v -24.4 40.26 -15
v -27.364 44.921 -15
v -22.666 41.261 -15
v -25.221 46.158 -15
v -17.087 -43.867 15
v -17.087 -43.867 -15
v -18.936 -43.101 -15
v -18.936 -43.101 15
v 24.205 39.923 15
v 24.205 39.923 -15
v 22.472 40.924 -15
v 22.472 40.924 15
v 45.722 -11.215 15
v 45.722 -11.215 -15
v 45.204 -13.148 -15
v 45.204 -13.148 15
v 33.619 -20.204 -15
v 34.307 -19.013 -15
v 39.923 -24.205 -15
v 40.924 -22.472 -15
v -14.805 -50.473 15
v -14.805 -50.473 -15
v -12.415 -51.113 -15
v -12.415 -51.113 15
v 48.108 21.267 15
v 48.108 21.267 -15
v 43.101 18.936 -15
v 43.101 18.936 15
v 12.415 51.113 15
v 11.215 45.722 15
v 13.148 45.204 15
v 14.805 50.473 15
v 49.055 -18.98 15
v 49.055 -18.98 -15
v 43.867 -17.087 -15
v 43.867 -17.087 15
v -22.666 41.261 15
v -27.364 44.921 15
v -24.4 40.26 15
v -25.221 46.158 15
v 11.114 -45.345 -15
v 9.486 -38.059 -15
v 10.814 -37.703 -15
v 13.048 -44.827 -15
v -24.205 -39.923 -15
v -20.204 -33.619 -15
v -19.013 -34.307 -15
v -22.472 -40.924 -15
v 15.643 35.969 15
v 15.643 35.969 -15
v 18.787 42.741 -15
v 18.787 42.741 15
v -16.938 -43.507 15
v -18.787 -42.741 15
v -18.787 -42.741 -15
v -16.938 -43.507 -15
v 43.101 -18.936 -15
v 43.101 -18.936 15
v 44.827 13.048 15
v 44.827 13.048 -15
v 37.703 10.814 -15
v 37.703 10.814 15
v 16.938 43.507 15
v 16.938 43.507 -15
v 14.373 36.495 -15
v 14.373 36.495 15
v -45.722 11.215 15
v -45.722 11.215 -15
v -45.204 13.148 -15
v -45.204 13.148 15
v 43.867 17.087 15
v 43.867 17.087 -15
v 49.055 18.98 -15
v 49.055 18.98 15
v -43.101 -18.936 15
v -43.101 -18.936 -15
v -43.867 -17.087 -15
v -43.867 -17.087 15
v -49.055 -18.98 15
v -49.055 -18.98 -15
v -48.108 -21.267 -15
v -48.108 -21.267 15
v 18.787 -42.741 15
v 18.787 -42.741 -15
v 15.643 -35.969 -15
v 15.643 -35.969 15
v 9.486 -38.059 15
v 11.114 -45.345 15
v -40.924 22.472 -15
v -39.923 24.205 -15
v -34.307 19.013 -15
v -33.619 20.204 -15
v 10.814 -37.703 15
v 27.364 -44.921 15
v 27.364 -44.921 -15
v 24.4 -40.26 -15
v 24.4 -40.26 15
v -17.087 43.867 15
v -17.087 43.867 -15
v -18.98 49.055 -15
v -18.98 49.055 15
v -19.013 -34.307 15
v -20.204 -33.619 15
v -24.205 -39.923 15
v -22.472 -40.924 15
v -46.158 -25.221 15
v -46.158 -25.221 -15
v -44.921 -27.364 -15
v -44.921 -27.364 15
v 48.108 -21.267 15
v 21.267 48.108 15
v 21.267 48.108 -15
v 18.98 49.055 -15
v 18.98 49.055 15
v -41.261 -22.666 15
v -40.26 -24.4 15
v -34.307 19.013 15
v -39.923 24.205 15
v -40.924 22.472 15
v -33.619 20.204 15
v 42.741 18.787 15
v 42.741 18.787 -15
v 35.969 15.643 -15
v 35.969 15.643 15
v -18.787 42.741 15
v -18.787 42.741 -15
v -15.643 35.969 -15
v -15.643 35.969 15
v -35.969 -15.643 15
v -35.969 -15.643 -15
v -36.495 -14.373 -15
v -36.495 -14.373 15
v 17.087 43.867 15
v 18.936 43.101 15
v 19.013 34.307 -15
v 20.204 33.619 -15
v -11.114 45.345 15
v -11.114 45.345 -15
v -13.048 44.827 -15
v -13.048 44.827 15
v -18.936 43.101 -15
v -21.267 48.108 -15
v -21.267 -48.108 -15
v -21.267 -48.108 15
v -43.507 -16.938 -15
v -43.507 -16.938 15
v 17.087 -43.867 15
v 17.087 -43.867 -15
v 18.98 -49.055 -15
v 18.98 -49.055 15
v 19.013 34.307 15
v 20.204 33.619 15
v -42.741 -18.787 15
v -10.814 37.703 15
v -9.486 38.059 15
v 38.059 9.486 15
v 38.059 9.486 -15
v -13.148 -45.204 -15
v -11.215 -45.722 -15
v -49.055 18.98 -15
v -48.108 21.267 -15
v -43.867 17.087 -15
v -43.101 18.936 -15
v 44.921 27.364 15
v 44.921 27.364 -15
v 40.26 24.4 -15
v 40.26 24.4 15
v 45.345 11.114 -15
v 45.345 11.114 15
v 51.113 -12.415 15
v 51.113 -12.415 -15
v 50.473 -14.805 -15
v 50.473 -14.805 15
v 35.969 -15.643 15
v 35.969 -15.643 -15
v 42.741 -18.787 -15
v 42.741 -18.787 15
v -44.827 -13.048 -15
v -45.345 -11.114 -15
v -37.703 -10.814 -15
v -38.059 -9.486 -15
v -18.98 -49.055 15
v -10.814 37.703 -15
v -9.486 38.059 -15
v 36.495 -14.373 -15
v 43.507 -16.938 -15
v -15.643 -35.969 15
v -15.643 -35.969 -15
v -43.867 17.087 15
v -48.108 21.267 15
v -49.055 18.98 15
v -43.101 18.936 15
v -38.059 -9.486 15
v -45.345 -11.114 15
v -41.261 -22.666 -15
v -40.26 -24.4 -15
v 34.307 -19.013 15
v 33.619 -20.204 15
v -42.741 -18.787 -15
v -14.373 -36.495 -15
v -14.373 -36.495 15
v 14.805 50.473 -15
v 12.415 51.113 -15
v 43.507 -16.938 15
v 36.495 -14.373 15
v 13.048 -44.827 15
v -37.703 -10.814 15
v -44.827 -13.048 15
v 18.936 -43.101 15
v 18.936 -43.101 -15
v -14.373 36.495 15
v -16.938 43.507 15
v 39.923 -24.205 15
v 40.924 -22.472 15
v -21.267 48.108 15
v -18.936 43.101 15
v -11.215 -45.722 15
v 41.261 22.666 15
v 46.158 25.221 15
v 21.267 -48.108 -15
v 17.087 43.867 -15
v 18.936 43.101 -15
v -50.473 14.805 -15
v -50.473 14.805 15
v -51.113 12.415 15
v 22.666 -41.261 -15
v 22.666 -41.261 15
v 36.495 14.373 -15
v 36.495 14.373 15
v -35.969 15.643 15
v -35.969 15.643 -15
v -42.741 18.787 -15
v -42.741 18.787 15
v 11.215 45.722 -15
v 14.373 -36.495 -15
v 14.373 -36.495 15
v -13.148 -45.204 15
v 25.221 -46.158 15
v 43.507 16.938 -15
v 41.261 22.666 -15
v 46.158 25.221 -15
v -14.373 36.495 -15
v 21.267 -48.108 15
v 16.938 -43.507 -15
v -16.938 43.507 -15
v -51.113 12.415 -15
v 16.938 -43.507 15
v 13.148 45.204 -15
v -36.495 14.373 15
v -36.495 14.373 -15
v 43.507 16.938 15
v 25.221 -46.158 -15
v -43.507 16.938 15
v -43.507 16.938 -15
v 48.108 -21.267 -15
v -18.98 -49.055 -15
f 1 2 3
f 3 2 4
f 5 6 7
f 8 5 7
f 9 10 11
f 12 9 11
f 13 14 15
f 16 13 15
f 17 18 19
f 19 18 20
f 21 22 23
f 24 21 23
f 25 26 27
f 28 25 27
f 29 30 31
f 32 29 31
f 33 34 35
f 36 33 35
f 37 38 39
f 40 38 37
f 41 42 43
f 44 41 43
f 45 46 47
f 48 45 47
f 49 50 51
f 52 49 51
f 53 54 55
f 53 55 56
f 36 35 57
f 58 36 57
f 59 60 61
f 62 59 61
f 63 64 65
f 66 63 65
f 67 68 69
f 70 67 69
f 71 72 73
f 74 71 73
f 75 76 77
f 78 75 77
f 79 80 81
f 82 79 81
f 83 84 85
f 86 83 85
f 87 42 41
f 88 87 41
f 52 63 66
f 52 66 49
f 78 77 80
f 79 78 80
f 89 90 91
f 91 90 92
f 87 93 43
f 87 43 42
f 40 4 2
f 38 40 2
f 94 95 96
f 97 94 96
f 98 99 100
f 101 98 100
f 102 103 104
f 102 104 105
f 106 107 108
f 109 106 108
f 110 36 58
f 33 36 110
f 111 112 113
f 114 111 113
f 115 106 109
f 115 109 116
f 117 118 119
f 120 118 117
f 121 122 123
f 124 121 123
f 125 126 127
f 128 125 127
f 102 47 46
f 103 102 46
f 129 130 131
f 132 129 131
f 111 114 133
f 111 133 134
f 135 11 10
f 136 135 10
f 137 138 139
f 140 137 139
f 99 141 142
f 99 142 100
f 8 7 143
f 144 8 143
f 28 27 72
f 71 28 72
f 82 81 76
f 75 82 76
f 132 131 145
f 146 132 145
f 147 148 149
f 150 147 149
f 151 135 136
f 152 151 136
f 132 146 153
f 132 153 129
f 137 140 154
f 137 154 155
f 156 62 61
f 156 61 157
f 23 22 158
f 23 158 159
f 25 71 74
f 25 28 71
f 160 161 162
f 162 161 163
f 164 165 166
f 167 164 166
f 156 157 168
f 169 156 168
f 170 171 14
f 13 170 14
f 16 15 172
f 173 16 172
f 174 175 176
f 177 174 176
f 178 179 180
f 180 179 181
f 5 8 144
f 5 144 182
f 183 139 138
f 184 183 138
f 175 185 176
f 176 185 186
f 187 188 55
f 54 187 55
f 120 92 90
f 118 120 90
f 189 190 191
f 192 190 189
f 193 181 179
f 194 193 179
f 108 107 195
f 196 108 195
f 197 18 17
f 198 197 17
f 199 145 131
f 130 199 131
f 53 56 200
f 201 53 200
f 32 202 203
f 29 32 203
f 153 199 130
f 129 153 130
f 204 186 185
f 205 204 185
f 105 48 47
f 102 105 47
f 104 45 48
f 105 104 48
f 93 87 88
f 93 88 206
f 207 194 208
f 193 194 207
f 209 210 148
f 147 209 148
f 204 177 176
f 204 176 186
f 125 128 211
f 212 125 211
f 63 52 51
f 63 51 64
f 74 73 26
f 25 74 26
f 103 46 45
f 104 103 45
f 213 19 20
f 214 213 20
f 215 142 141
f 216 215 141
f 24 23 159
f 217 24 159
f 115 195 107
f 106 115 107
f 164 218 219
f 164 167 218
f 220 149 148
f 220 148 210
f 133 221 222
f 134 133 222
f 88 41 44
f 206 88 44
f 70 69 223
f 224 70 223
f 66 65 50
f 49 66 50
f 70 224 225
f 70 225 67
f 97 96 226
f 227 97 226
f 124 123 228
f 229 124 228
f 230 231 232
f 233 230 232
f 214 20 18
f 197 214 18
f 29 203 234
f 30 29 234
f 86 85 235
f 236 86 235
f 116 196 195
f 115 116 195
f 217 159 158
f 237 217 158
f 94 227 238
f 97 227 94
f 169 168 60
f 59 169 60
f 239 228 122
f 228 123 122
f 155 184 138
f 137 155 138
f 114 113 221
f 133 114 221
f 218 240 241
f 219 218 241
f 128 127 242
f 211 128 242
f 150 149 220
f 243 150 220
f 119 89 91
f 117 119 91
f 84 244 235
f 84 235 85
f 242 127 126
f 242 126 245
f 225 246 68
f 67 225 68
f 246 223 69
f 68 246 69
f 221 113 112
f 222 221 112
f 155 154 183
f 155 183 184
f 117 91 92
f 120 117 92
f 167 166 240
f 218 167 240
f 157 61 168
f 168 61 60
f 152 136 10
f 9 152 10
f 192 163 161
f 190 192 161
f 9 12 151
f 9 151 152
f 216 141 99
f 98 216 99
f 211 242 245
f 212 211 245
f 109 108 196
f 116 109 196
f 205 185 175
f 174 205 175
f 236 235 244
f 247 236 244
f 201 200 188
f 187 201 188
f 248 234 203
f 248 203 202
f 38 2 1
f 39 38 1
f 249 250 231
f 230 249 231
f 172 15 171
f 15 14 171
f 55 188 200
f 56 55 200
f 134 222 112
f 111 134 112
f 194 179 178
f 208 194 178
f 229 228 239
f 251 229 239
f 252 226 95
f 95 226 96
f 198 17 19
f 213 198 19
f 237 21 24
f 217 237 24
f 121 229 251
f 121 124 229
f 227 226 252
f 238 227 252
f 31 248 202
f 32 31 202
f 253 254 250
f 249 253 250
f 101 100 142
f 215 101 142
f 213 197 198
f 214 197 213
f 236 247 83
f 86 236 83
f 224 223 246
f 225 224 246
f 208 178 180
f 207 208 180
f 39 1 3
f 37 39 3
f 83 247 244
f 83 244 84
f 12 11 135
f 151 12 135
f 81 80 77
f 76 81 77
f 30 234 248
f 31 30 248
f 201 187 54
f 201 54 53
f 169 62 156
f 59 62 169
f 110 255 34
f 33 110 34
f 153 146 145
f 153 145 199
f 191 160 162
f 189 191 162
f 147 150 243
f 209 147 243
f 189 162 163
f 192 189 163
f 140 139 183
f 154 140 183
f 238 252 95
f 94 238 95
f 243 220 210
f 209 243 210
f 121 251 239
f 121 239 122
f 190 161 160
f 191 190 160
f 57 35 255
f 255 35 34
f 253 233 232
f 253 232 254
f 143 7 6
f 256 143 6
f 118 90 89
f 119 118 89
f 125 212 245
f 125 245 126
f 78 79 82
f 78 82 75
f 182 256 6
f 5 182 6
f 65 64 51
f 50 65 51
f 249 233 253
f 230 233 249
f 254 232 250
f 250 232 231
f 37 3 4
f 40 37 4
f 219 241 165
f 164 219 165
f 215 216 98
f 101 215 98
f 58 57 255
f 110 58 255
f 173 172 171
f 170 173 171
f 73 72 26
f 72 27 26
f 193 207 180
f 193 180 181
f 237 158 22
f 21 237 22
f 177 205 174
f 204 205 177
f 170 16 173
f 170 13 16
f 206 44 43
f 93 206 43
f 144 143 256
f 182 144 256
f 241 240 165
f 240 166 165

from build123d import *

# Parameters (mm, degrees)
SLOT_COPPER_ENVELOPES_START    = -15
SLOT_COPPER_ENVELOPES_DEPTH    = 30
SLOT_COPPER_ENVELOPES_2_DEPTH  = 30
SLOT_COPPER_ENVELOPES_3_DEPTH  = 30
SLOT_COPPER_ENVELOPES_4_DEPTH  = 30
SLOT_COPPER_ENVELOPES_5_DEPTH  = 30
SLOT_COPPER_ENVELOPES_6_DEPTH  = 30
SLOT_COPPER_ENVELOPES_7_DEPTH  = 30
SLOT_COPPER_ENVELOPES_8_DEPTH  = 30
SLOT_COPPER_ENVELOPES_9_DEPTH  = 30
SLOT_COPPER_ENVELOPES_10_DEPTH = 30
SLOT_COPPER_ENVELOPES_11_DEPTH = 30
SLOT_COPPER_ENVELOPES_12_DEPTH = 30
SLOT_COPPER_ENVELOPES_13_DEPTH = 30
SLOT_COPPER_ENVELOPES_14_DEPTH = 30
SLOT_COPPER_ENVELOPES_15_DEPTH = 30
SLOT_COPPER_ENVELOPES_16_DEPTH = 30
SLOT_COPPER_ENVELOPES_17_DEPTH = 30
SLOT_COPPER_ENVELOPES_18_DEPTH = 30
SLOT_COPPER_ENVELOPES_19_DEPTH = 30
SLOT_COPPER_ENVELOPES_20_DEPTH = 30
SLOT_COPPER_ENVELOPES_21_DEPTH = 30
SLOT_COPPER_ENVELOPES_22_DEPTH = 30
SLOT_COPPER_ENVELOPES_23_DEPTH = 30
SLOT_COPPER_ENVELOPES_24_DEPTH = 30
SLOT_COPPER_ENVELOPES_25_DEPTH = 30
SLOT_COPPER_ENVELOPES_26_DEPTH = 30
SLOT_COPPER_ENVELOPES_27_DEPTH = 30
SLOT_COPPER_ENVELOPES_28_DEPTH = 30
SLOT_COPPER_ENVELOPES_29_DEPTH = 30
SLOT_COPPER_ENVELOPES_30_DEPTH = 30
SLOT_COPPER_ENVELOPES_31_DEPTH = 30
SLOT_COPPER_ENVELOPES_32_DEPTH = 30


with BuildPart() as part:
    # Эскиз1 → Slot_copper_envelopes (new body)
    with BuildSketch(Plane.XY.offset(SLOT_COPPER_ENVELOPES_START)):
        Polygon((38.058700706, 9.486045745), (45.345480219, 11.114145895), (44.827410764, 13.047607424), (37.702824519, 10.814193756), align=None)
    extrude(amount=SLOT_COPPER_ENVELOPES_DEPTH)


with BuildPart() as body_2:
    # Эскиз1 → Slot_copper_envelopes 2 (new body)
    with BuildSketch(Plane.XY.offset(SLOT_COPPER_ENVELOPES_START)):
        Polygon((43.866578102, 17.086837391), (49.055420626, 18.979960184), (48.108279131, 21.266562026), (43.100573431, 18.936136255), align=None)
    extrude(amount=SLOT_COPPER_ENVELOPES_2_DEPTH)


with BuildPart() as body_3:
    # Эскиз1 → Slot_copper_envelopes 3 (new body)
    with BuildSketch(Plane.XY.offset(SLOT_COPPER_ENVELOPES_START)):
        Polygon((36.494925815, 14.372548593), (43.506856207, 16.937835703), (42.740851536, 18.787134567), (35.968736096, 15.64288295), align=None)
    extrude(amount=SLOT_COPPER_ENVELOPES_3_DEPTH)


with BuildPart() as body_4:
    # Эскиз1 → Slot_copper_envelopes 4 (new body)
    with BuildSketch(Plane.XY.offset(SLOT_COPPER_ENVELOPES_START)):
        Polygon((41.261013623, 22.666394534), (46.158362771, 25.220601255), (44.920862771, 27.364014129), (40.26018029, 24.399888717), align=None)
    extrude(amount=SLOT_COPPER_ENVELOPES_4_DEPTH)


with BuildPart() as body_5:
    # Эскиз1 → Slot_copper_envelopes 5 (new body)
    with BuildSketch(Plane.XY.offset(SLOT_COPPER_ENVELOPES_START)):
        Polygon((20.203918079, 33.619212625), (24.20520863, 39.922984488), (22.471714447, 40.923817822), (19.013133149, 34.306712625), align=None)
    extrude(amount=SLOT_COPPER_ENVELOPES_5_DEPTH)


with BuildPart() as body_6:
    # Эскиз1 → Slot_copper_envelopes 6 (new body)
    with BuildSketch(Plane.XY.offset(SLOT_COPPER_ENVELOPES_START)):
        Polygon((18.936136255, 43.100573431), (21.266562026, 48.108279131), (18.979960184, 49.055420626), (17.086837391, 43.866578102), align=None)
    extrude(amount=SLOT_COPPER_ENVELOPES_6_DEPTH)


with BuildPart() as body_7:
    # Эскиз1 → Slot_copper_envelopes 7 (new body)
    with BuildSketch(Plane.XY.offset(SLOT_COPPER_ENVELOPES_START)):
        Polygon((15.64288295, 35.968736096), (18.787134567, 42.740851536), (16.937835703, 43.506856207), (14.372548593, 36.494925815), align=None)
    extrude(amount=SLOT_COPPER_ENVELOPES_7_DEPTH)


with BuildPart() as body_8:
    # Эскиз1 → Slot_copper_envelopes 8 (new body)
    with BuildSketch(Plane.XY.offset(SLOT_COPPER_ENVELOPES_START)):
        Polygon((13.148381252, 45.203503812), (14.805233151, 50.472549497), (12.414566731, 51.113126634), (11.214919723, 45.721573267), align=None)
    extrude(amount=SLOT_COPPER_ENVELOPES_8_DEPTH)


with BuildPart() as body_9:
    # Эскиз1 → Slot_copper_envelopes 9 (new body)
    with BuildSketch(Plane.XY.offset(SLOT_COPPER_ENVELOPES_START)):
        Polygon((-9.486045745, 38.058700706), (-11.114145895, 45.345480219), (-13.047607424, 44.827410764), (-10.814193756, 37.702824519), align=None)
    extrude(amount=SLOT_COPPER_ENVELOPES_9_DEPTH)


with BuildPart() as body_10:
    # Эскиз1 → Slot_copper_envelopes 10 (new body)
    with BuildSketch(Plane.XY.offset(SLOT_COPPER_ENVELOPES_START)):
        Polygon((-17.086837391, 43.866578102), (-18.979960183, 49.055420626), (-21.266562026, 48.108279131), (-18.936136255, 43.100573431), align=None)
    extrude(amount=SLOT_COPPER_ENVELOPES_10_DEPTH)


with BuildPart() as body_11:
    # Эскиз1 → Slot_copper_envelopes 11 (new body)
    with BuildSketch(Plane.XY.offset(SLOT_COPPER_ENVELOPES_START)):
        Polygon((-14.372548593, 36.494925815), (-16.937835703, 43.506856207), (-18.787134567, 42.740851536), (-15.64288295, 35.968736096), align=None)
    extrude(amount=SLOT_COPPER_ENVELOPES_11_DEPTH)


with BuildPart() as body_12:
    # Эскиз1 → Slot_copper_envelopes 12 (new body)
    with BuildSketch(Plane.XY.offset(SLOT_COPPER_ENVELOPES_START)):
        Polygon((-22.666394534, 41.261013623), (-25.220601255, 46.158362771), (-27.364014129, 44.920862771), (-24.399888717, 40.26018029), align=None)
    extrude(amount=SLOT_COPPER_ENVELOPES_12_DEPTH)


with BuildPart() as body_13:
    # Эскиз1 → Slot_copper_envelopes 13 (new body)
    with BuildSketch(Plane.XY.offset(SLOT_COPPER_ENVELOPES_START)):
        Polygon((-33.619212625, 20.203918079), (-39.922984488, 24.20520863), (-40.923817822, 22.471714447), (-34.306712625, 19.013133149), align=None)
    extrude(amount=SLOT_COPPER_ENVELOPES_13_DEPTH)


with BuildPart() as body_14:
    # Эскиз1 → Slot_copper_envelopes 14 (new body)
    with BuildSketch(Plane.XY.offset(SLOT_COPPER_ENVELOPES_START)):
        Polygon((-43.100573431, 18.936136255), (-48.108279131, 21.266562026), (-49.055420626, 18.979960184), (-43.866578102, 17.086837391), align=None)
    extrude(amount=SLOT_COPPER_ENVELOPES_14_DEPTH)


with BuildPart() as body_15:
    # Эскиз1 → Slot_copper_envelopes 15 (new body)
    with BuildSketch(Plane.XY.offset(SLOT_COPPER_ENVELOPES_START)):
        Polygon((-35.968736096, 15.64288295), (-42.740851536, 18.787134567), (-43.506856207, 16.937835703), (-36.494925815, 14.372548593), align=None)
    extrude(amount=SLOT_COPPER_ENVELOPES_15_DEPTH)


with BuildPart() as body_16:
    # Эскиз1 → Slot_copper_envelopes 16 (new body)
    with BuildSketch(Plane.XY.offset(SLOT_COPPER_ENVELOPES_START)):
        Polygon((-45.203503812, 13.148381252), (-50.472549497, 14.805233151), (-51.113126634, 12.414566731), (-45.721573267, 11.214919723), align=None)
    extrude(amount=SLOT_COPPER_ENVELOPES_16_DEPTH)


with BuildPart() as body_17:
    # Эскиз1 → Slot_copper_envelopes 17 (new body)
    with BuildSketch(Plane.XY.offset(SLOT_COPPER_ENVELOPES_START)):
        Polygon((-38.058700706, -9.486045745), (-45.345480219, -11.114145895), (-44.827410764, -13.047607424), (-37.702824519, -10.814193756), align=None)
    extrude(amount=SLOT_COPPER_ENVELOPES_17_DEPTH)


with BuildPart() as body_18:
    # Эскиз1 → Slot_copper_envelopes 18 (new body)
    with BuildSketch(Plane.XY.offset(SLOT_COPPER_ENVELOPES_START)):
        Polygon((-43.866578102, -17.086837391), (-49.055420626, -18.979960184), (-48.108279131, -21.266562026), (-43.100573431, -18.936136255), align=None)
    extrude(amount=SLOT_COPPER_ENVELOPES_18_DEPTH)


with BuildPart() as body_19:
    # Эскиз1 → Slot_copper_envelopes 19 (new body)
    with BuildSketch(Plane.XY.offset(SLOT_COPPER_ENVELOPES_START)):
        Polygon((-36.494925815, -14.372548593), (-43.506856207, -16.937835703), (-42.740851536, -18.787134567), (-35.968736096, -15.64288295), align=None)
    extrude(amount=SLOT_COPPER_ENVELOPES_19_DEPTH)


with BuildPart() as body_20:
    # Эскиз1 → Slot_copper_envelopes 20 (new body)
    with BuildSketch(Plane.XY.offset(SLOT_COPPER_ENVELOPES_START)):
        Polygon((-41.261013623, -22.666394534), (-46.158362771, -25.220601255), (-44.920862771, -27.364014129), (-40.26018029, -24.399888717), align=None)
    extrude(amount=SLOT_COPPER_ENVELOPES_20_DEPTH)


with BuildPart() as body_21:
    # Эскиз1 → Slot_copper_envelopes 21 (new body)
    with BuildSketch(Plane.XY.offset(SLOT_COPPER_ENVELOPES_START)):
        Polygon((-20.203918079, -33.619212625), (-24.20520863, -39.922984488), (-22.471714447, -40.923817822), (-19.013133149, -34.306712625), align=None)
    extrude(amount=SLOT_COPPER_ENVELOPES_21_DEPTH)


with BuildPart() as body_22:
    # Эскиз1 → Slot_copper_envelopes 22 (new body)
    with BuildSketch(Plane.XY.offset(SLOT_COPPER_ENVELOPES_START)):
        Polygon((-18.936136255, -43.100573431), (-21.266562026, -48.108279131), (-18.979960183, -49.055420626), (-17.086837391, -43.866578102), align=None)
    extrude(amount=SLOT_COPPER_ENVELOPES_22_DEPTH)


with BuildPart() as body_23:
    # Эскиз1 → Slot_copper_envelopes 23 (new body)
    with BuildSketch(Plane.XY.offset(SLOT_COPPER_ENVELOPES_START)):
        Polygon((-15.64288295, -35.968736096), (-18.787134567, -42.740851536), (-16.937835703, -43.506856207), (-14.372548593, -36.494925815), align=None)
    extrude(amount=SLOT_COPPER_ENVELOPES_23_DEPTH)


with BuildPart() as body_24:
    # Эскиз1 → Slot_copper_envelopes 24 (new body)
    with BuildSketch(Plane.XY.offset(SLOT_COPPER_ENVELOPES_START)):
        Polygon((-13.148381252, -45.203503812), (-14.805233151, -50.472549497), (-12.414566731, -51.113126634), (-11.214919723, -45.721573267), align=None)
    extrude(amount=SLOT_COPPER_ENVELOPES_24_DEPTH)


with BuildPart() as body_25:
    # Эскиз1 → Slot_copper_envelopes 25 (new body)
    with BuildSketch(Plane.XY.offset(SLOT_COPPER_ENVELOPES_START)):
        Polygon((9.486045745, -38.058700706), (11.114145895, -45.345480219), (13.047607424, -44.827410764), (10.814193756, -37.702824519), align=None)
    extrude(amount=SLOT_COPPER_ENVELOPES_25_DEPTH)


with BuildPart() as body_26:
    # Эскиз1 → Slot_copper_envelopes 26 (new body)
    with BuildSketch(Plane.XY.offset(SLOT_COPPER_ENVELOPES_START)):
        Polygon((17.086837391, -43.866578102), (18.979960183, -49.055420626), (21.266562026, -48.108279131), (18.936136255, -43.100573431), align=None)
    extrude(amount=SLOT_COPPER_ENVELOPES_26_DEPTH)


with BuildPart() as body_27:
    # Эскиз1 → Slot_copper_envelopes 27 (new body)
    with BuildSketch(Plane.XY.offset(SLOT_COPPER_ENVELOPES_START)):
        Polygon((14.372548593, -36.494925815), (16.937835703, -43.506856207), (18.787134567, -42.740851536), (15.64288295, -35.968736096), align=None)
    extrude(amount=SLOT_COPPER_ENVELOPES_27_DEPTH)


with BuildPart() as body_28:
    # Эскиз1 → Slot_copper_envelopes 28 (new body)
    with BuildSketch(Plane.XY.offset(SLOT_COPPER_ENVELOPES_START)):
        Polygon((22.666394534, -41.261013623), (25.220601255, -46.158362771), (27.364014129, -44.920862771), (24.399888717, -40.26018029), align=None)
    extrude(amount=SLOT_COPPER_ENVELOPES_28_DEPTH)


with BuildPart() as body_29:
    # Эскиз1 → Slot_copper_envelopes 29 (new body)
    with BuildSketch(Plane.XY.offset(SLOT_COPPER_ENVELOPES_START)):
        Polygon((33.619212625, -20.203918079), (39.922984488, -24.20520863), (40.923817822, -22.471714447), (34.306712625, -19.013133149), align=None)
    extrude(amount=SLOT_COPPER_ENVELOPES_29_DEPTH)


with BuildPart() as body_30:
    # Эскиз1 → Slot_copper_envelopes 30 (new body)
    with BuildSketch(Plane.XY.offset(SLOT_COPPER_ENVELOPES_START)):
        Polygon((43.100573431, -18.936136255), (48.108279131, -21.266562026), (49.055420626, -18.979960183), (43.866578102, -17.086837391), align=None)
    extrude(amount=SLOT_COPPER_ENVELOPES_30_DEPTH)


with BuildPart() as body_31:
    # Эскиз1 → Slot_copper_envelopes 31 (new body)
    with BuildSketch(Plane.XY.offset(SLOT_COPPER_ENVELOPES_START)):
        Polygon((35.968736096, -15.64288295), (42.740851536, -18.787134567), (43.506856207, -16.937835703), (36.494925815, -14.372548593), align=None)
    extrude(amount=SLOT_COPPER_ENVELOPES_31_DEPTH)


with BuildPart() as body_32:
    # Эскиз1 → Slot_copper_envelopes 32 (new body)
    with BuildSketch(Plane.XY.offset(SLOT_COPPER_ENVELOPES_START)):
        Polygon((45.203503812, -13.148381252), (50.472549497, -14.805233151), (51.113126634, -12.414566731), (45.721573267, -11.214919723), align=None)
    extrude(amount=SLOT_COPPER_ENVELOPES_32_DEPTH)


solid = Compound([part.part, body_2.part, body_3.part, body_4.part, body_5.part, body_6.part, body_7.part, body_8.part, body_9.part, body_10.part, body_11.part, body_12.part, body_13.part, body_14.part, body_15.part, body_16.part, body_17.part, body_18.part, body_19.part, body_20.part, body_21.part, body_22.part, body_23.part, body_24.part, body_25.part, body_26.part, body_27.part, body_28.part, body_29.part, body_30.part, body_31.part, body_32.part])
